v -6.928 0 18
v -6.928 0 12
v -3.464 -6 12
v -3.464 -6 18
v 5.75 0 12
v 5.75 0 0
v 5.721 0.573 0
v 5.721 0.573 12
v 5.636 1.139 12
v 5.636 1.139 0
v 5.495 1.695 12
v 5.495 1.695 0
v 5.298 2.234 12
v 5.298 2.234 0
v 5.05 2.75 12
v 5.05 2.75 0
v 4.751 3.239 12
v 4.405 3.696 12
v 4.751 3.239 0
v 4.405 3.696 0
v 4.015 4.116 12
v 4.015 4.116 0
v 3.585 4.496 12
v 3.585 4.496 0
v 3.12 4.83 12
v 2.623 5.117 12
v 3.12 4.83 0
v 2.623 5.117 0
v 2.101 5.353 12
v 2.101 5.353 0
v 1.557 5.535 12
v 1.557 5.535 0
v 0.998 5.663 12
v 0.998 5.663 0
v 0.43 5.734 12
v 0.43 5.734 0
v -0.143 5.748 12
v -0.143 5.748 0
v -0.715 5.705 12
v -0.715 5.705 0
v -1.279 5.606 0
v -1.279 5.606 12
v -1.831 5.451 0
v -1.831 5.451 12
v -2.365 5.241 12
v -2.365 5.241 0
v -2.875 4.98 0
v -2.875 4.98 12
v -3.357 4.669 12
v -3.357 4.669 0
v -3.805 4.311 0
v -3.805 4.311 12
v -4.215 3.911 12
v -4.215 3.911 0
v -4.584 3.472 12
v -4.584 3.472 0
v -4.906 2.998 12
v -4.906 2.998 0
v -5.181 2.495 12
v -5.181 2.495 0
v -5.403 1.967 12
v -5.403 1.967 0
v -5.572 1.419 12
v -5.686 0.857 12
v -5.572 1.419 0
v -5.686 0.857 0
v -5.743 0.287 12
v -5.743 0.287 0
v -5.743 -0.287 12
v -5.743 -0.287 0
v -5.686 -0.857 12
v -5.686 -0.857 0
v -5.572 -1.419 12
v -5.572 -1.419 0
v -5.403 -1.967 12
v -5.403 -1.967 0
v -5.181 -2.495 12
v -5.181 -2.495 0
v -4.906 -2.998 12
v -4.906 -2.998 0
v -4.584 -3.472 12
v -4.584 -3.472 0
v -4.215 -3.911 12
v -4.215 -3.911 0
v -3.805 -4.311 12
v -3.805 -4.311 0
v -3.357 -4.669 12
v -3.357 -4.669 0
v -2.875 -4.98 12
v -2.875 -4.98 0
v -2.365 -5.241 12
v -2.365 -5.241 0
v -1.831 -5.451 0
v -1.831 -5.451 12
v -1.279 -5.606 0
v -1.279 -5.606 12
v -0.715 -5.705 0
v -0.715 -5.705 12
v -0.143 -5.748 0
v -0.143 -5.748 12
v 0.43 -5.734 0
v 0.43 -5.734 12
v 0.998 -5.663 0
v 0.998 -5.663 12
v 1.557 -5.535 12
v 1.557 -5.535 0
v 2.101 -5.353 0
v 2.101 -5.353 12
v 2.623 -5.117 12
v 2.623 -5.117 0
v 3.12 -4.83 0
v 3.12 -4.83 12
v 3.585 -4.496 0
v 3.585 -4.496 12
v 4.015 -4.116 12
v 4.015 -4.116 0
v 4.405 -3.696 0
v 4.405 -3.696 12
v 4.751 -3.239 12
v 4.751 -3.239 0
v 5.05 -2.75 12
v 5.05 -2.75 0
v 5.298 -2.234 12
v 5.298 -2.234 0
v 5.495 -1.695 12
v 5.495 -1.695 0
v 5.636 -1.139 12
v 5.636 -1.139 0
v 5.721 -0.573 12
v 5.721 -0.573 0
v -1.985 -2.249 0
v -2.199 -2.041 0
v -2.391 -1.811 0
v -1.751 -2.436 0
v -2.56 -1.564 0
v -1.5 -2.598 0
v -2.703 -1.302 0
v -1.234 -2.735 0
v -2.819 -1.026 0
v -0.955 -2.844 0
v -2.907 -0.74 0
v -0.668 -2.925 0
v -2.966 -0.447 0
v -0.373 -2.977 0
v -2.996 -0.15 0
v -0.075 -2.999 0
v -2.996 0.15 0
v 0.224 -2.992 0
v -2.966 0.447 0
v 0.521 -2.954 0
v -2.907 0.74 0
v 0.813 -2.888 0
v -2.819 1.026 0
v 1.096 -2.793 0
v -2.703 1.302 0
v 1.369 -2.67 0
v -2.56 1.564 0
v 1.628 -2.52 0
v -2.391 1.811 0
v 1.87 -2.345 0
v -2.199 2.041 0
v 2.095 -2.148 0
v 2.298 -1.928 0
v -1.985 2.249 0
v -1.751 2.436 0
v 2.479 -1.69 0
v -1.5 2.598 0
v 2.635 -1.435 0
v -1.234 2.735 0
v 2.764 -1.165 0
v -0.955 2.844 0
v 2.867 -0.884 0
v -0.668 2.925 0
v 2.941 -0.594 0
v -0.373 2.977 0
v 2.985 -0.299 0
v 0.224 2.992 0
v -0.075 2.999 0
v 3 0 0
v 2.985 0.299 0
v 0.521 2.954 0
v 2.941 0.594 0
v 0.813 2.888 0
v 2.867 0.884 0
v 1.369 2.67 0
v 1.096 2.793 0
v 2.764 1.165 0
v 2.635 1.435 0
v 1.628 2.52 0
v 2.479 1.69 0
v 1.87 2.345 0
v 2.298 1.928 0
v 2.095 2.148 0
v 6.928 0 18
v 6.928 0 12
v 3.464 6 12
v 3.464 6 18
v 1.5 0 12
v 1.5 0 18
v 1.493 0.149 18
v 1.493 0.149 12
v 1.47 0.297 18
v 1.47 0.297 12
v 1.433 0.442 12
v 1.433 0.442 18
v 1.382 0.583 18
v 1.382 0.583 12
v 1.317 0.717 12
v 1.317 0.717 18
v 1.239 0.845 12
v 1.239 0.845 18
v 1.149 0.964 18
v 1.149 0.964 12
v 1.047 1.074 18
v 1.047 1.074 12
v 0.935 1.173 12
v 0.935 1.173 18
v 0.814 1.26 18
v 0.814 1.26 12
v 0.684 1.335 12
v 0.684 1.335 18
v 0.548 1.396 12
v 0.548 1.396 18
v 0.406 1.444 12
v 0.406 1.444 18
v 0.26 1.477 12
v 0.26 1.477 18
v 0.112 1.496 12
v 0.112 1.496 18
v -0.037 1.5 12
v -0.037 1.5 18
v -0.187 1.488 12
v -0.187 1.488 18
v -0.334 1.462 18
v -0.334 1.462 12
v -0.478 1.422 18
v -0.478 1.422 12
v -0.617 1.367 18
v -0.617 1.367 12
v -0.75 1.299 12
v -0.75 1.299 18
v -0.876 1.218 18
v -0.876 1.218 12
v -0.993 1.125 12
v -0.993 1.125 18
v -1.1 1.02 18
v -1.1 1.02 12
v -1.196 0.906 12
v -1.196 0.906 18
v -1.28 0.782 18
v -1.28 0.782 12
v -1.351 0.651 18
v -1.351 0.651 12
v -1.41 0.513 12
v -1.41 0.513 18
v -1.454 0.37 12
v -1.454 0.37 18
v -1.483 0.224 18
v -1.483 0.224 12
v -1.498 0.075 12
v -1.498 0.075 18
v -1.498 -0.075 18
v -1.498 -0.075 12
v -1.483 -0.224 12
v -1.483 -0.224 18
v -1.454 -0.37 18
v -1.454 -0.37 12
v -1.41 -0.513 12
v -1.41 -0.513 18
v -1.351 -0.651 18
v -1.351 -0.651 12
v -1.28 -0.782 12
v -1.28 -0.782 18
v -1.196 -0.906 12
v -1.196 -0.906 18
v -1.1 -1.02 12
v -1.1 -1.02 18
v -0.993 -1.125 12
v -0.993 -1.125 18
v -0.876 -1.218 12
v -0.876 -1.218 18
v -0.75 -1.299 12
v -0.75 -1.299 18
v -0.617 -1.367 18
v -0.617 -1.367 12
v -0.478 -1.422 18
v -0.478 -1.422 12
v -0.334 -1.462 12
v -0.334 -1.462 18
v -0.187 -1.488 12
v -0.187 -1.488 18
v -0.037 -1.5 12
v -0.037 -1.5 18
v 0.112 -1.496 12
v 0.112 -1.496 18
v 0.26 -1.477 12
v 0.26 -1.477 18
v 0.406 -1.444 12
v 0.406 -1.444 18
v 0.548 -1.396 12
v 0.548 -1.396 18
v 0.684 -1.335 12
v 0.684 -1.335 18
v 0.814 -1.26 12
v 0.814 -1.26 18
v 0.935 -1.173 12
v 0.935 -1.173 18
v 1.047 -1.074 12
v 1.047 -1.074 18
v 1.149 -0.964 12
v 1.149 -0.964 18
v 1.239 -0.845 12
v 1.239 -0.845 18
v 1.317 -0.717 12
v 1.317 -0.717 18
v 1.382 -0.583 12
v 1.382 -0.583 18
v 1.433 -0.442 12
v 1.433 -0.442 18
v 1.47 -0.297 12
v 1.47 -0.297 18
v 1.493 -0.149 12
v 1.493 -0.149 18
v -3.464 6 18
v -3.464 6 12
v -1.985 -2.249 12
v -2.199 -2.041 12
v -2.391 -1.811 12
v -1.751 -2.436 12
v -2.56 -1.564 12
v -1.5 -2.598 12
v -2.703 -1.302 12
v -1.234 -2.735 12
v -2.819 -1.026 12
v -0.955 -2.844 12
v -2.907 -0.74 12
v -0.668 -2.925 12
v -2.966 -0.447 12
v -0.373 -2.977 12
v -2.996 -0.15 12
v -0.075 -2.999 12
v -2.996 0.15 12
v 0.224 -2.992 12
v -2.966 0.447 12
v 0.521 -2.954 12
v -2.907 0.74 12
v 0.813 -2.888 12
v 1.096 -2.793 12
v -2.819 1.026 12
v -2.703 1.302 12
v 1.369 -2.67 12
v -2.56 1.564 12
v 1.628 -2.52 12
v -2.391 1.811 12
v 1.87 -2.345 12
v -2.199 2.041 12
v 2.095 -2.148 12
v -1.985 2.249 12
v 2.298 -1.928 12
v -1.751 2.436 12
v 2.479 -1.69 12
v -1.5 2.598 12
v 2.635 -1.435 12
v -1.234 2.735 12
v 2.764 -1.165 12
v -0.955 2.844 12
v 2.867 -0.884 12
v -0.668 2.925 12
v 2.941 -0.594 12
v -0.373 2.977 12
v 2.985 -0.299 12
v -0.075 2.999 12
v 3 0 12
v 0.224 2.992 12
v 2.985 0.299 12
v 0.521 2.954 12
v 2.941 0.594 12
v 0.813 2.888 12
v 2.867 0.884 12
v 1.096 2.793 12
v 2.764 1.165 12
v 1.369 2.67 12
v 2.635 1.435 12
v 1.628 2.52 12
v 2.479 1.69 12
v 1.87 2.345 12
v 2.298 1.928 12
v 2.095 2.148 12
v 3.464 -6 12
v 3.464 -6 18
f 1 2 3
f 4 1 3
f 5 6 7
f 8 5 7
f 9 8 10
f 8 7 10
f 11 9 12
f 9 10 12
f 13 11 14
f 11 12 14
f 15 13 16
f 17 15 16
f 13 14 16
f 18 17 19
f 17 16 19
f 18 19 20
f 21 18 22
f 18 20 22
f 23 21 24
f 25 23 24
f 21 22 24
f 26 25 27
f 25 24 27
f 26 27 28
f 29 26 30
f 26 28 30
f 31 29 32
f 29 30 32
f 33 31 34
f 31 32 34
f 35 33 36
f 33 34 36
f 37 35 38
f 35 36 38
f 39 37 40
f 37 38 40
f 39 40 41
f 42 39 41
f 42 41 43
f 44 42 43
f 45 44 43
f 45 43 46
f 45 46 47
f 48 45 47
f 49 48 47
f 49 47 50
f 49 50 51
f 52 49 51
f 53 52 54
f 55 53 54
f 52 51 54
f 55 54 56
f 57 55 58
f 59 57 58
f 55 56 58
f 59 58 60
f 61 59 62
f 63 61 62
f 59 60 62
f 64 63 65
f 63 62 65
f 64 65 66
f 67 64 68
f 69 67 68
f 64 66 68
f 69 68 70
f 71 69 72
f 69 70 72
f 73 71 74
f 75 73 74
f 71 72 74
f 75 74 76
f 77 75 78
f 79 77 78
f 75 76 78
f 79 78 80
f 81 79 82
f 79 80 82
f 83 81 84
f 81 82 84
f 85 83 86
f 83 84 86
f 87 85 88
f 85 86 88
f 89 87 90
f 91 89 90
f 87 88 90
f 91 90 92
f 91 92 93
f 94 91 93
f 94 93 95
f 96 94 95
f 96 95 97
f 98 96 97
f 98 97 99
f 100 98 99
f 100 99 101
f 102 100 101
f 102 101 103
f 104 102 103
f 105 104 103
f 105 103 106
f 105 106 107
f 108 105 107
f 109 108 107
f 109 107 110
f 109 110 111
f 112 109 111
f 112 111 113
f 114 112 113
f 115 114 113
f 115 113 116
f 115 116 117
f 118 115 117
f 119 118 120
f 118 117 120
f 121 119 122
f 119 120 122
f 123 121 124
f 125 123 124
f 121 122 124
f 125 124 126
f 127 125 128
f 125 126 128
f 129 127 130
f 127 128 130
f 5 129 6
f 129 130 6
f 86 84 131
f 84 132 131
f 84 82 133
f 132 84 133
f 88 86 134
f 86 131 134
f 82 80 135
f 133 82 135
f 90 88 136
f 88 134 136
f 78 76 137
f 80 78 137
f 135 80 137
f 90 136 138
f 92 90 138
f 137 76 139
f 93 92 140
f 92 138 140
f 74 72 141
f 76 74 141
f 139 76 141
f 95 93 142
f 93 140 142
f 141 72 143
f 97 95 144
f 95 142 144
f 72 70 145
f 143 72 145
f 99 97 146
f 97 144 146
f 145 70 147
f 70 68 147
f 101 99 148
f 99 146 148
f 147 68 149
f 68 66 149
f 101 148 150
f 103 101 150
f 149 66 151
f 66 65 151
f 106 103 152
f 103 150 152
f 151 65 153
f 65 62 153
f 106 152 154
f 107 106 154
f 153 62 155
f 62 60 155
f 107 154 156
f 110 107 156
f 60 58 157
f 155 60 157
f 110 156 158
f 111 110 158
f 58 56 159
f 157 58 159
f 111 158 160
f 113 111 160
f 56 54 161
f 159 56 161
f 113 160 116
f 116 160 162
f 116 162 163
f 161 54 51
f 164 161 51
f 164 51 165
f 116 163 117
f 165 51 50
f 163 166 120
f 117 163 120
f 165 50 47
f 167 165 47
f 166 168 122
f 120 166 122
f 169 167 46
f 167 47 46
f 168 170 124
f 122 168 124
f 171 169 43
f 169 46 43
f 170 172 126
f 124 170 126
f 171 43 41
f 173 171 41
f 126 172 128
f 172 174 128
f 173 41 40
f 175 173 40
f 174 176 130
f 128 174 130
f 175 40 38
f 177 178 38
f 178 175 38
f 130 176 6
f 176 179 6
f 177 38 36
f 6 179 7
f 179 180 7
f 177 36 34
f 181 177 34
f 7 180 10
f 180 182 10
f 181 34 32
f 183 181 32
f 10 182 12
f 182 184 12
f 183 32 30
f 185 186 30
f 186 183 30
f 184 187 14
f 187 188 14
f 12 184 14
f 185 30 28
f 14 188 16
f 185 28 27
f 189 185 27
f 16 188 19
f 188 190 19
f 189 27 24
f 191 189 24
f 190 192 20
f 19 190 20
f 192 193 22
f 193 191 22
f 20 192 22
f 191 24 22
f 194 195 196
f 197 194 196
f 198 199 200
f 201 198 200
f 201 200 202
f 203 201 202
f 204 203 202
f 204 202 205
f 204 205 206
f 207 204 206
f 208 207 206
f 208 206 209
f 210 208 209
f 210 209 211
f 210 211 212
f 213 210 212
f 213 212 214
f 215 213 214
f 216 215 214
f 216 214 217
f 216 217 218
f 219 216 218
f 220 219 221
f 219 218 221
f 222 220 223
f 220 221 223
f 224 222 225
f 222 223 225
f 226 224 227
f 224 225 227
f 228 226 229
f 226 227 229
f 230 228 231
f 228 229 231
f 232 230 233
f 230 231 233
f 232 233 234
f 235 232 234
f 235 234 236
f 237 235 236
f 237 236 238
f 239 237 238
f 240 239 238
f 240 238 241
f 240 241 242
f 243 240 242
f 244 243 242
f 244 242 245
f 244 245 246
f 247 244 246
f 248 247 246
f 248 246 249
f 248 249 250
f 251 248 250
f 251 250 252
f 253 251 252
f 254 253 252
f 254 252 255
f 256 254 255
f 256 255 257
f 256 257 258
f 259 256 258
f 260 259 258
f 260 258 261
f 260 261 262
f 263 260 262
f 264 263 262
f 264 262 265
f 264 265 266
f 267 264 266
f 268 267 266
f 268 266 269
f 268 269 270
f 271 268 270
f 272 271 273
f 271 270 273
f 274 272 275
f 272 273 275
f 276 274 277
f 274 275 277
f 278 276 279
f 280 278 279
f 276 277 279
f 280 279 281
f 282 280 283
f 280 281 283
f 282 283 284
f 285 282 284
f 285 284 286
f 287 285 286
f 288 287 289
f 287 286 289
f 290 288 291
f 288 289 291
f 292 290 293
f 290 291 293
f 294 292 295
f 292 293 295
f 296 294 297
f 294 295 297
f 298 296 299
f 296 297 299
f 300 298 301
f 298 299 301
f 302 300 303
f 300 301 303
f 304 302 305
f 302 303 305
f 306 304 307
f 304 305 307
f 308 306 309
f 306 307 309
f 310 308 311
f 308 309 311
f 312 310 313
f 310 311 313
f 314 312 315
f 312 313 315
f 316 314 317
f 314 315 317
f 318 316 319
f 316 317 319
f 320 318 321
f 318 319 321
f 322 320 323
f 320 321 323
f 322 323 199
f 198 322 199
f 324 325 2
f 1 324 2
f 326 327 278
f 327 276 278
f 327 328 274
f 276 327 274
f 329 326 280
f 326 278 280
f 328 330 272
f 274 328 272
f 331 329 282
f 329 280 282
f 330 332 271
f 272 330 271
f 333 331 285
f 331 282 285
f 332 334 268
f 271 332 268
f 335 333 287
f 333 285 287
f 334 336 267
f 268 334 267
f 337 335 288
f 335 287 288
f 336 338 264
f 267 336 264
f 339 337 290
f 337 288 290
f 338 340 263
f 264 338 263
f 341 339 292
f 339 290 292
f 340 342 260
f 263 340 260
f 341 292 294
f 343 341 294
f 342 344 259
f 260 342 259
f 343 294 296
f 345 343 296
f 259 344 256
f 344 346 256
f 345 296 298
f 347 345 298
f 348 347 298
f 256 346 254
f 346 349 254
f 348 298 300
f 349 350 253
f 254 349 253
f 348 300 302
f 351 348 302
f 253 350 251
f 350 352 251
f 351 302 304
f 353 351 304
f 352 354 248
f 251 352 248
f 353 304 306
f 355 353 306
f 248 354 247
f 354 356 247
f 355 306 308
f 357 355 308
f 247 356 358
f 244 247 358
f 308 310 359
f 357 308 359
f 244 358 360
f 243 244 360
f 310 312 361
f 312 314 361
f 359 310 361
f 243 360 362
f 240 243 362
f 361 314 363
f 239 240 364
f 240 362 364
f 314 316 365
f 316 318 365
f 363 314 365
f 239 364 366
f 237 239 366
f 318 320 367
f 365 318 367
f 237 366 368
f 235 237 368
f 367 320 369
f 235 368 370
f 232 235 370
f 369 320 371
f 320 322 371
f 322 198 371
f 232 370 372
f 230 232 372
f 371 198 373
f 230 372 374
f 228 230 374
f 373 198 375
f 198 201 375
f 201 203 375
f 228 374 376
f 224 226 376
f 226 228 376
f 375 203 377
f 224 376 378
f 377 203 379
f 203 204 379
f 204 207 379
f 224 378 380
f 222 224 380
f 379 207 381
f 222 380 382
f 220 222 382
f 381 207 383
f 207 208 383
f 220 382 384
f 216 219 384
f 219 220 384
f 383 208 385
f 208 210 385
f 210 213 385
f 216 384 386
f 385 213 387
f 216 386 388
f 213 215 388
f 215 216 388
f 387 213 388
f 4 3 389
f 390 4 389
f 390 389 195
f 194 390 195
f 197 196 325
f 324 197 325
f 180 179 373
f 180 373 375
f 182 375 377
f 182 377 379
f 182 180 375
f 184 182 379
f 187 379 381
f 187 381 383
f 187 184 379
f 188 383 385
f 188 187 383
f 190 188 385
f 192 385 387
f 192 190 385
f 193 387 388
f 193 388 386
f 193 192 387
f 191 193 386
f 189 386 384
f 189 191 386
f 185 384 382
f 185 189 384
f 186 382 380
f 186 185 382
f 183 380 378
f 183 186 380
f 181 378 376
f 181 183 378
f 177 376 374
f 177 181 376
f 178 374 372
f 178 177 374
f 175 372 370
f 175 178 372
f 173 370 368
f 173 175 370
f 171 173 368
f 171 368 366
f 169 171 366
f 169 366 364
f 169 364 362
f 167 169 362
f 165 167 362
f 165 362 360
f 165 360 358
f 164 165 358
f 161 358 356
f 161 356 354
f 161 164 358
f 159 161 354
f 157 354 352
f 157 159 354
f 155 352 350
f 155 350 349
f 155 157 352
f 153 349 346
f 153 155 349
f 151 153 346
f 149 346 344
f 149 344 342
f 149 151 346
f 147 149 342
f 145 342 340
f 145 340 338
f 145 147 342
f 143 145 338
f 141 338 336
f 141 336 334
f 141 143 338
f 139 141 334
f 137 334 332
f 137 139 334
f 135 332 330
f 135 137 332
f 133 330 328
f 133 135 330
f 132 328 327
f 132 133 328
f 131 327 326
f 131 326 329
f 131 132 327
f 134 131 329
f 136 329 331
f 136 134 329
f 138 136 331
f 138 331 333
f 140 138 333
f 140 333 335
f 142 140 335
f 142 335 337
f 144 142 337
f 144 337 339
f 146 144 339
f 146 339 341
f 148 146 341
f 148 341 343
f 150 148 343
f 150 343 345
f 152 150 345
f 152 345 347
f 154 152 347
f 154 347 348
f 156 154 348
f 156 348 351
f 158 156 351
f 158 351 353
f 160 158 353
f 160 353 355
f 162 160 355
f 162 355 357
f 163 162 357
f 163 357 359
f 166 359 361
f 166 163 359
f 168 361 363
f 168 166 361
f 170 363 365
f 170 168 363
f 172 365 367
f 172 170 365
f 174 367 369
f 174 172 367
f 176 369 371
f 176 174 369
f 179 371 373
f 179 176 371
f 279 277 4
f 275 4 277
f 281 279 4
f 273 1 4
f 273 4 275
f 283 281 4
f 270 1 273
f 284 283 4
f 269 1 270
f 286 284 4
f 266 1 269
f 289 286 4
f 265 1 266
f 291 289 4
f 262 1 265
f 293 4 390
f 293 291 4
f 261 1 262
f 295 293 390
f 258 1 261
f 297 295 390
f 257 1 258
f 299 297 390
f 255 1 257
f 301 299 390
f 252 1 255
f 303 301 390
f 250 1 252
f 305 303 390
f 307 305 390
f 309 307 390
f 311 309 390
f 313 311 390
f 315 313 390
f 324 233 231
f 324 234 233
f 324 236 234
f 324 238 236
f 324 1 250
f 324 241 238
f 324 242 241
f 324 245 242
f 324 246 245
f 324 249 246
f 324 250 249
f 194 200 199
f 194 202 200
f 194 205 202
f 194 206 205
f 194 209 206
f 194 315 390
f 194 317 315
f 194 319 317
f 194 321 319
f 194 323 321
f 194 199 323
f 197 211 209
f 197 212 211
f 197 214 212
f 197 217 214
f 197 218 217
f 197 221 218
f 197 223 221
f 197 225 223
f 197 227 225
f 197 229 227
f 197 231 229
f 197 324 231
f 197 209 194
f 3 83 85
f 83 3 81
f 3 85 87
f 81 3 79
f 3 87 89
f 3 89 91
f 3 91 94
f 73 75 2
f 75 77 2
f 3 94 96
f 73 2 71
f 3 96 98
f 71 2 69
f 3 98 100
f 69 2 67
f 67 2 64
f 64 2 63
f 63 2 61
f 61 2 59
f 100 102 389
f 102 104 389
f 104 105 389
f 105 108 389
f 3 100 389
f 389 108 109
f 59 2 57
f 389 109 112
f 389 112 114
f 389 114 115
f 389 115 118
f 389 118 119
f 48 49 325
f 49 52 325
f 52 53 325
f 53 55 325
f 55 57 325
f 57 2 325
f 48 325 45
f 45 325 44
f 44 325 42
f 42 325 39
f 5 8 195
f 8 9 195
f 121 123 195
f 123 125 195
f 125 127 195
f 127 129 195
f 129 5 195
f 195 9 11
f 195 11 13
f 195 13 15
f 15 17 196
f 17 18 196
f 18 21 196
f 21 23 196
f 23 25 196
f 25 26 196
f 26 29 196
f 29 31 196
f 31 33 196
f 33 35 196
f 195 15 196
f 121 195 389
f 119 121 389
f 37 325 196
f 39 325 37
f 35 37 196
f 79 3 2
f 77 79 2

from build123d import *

# Parameters (mm, degrees)
SKETCH1_R           = 5.75
SKETCH1_R_2         = 3
BOSS_EXTRUDE1_DEPTH = 12
BOSS_EXTRUDE2_DEPTH = 6
SKETCH3_R           = 1.5
CUT_EXTRUDE1_DEPTH  = 21.199009877


with BuildPart() as part:
    # Sketch1 → Boss-Extrude1 (new body)
    with BuildSketch(Plane.XY):
        Circle(SKETCH1_R)
        Circle(SKETCH1_R_2, mode=Mode.SUBTRACT)
    extrude(amount=BOSS_EXTRUDE1_DEPTH)

    # Sketch2 → Boss-Extrude2 (add)
    with BuildSketch(Plane.XY.offset(12)):
        Polygon((3.464101615, -6), (6.92820323, 0), (3.464101615, 6), (-3.464101615, 6), (-6.92820323, 0), (-3.464101615, -6), align=None)
    extrude(amount=BOSS_EXTRUDE2_DEPTH)

    # Sketch3 → Cut-Extrude1 (cut, through all)
    with BuildSketch(Plane.XY.offset(18)):
        Circle(SKETCH3_R)
    extrude(amount=-CUT_EXTRUDE1_DEPTH, mode=Mode.SUBTRACT)


solid = part.part
